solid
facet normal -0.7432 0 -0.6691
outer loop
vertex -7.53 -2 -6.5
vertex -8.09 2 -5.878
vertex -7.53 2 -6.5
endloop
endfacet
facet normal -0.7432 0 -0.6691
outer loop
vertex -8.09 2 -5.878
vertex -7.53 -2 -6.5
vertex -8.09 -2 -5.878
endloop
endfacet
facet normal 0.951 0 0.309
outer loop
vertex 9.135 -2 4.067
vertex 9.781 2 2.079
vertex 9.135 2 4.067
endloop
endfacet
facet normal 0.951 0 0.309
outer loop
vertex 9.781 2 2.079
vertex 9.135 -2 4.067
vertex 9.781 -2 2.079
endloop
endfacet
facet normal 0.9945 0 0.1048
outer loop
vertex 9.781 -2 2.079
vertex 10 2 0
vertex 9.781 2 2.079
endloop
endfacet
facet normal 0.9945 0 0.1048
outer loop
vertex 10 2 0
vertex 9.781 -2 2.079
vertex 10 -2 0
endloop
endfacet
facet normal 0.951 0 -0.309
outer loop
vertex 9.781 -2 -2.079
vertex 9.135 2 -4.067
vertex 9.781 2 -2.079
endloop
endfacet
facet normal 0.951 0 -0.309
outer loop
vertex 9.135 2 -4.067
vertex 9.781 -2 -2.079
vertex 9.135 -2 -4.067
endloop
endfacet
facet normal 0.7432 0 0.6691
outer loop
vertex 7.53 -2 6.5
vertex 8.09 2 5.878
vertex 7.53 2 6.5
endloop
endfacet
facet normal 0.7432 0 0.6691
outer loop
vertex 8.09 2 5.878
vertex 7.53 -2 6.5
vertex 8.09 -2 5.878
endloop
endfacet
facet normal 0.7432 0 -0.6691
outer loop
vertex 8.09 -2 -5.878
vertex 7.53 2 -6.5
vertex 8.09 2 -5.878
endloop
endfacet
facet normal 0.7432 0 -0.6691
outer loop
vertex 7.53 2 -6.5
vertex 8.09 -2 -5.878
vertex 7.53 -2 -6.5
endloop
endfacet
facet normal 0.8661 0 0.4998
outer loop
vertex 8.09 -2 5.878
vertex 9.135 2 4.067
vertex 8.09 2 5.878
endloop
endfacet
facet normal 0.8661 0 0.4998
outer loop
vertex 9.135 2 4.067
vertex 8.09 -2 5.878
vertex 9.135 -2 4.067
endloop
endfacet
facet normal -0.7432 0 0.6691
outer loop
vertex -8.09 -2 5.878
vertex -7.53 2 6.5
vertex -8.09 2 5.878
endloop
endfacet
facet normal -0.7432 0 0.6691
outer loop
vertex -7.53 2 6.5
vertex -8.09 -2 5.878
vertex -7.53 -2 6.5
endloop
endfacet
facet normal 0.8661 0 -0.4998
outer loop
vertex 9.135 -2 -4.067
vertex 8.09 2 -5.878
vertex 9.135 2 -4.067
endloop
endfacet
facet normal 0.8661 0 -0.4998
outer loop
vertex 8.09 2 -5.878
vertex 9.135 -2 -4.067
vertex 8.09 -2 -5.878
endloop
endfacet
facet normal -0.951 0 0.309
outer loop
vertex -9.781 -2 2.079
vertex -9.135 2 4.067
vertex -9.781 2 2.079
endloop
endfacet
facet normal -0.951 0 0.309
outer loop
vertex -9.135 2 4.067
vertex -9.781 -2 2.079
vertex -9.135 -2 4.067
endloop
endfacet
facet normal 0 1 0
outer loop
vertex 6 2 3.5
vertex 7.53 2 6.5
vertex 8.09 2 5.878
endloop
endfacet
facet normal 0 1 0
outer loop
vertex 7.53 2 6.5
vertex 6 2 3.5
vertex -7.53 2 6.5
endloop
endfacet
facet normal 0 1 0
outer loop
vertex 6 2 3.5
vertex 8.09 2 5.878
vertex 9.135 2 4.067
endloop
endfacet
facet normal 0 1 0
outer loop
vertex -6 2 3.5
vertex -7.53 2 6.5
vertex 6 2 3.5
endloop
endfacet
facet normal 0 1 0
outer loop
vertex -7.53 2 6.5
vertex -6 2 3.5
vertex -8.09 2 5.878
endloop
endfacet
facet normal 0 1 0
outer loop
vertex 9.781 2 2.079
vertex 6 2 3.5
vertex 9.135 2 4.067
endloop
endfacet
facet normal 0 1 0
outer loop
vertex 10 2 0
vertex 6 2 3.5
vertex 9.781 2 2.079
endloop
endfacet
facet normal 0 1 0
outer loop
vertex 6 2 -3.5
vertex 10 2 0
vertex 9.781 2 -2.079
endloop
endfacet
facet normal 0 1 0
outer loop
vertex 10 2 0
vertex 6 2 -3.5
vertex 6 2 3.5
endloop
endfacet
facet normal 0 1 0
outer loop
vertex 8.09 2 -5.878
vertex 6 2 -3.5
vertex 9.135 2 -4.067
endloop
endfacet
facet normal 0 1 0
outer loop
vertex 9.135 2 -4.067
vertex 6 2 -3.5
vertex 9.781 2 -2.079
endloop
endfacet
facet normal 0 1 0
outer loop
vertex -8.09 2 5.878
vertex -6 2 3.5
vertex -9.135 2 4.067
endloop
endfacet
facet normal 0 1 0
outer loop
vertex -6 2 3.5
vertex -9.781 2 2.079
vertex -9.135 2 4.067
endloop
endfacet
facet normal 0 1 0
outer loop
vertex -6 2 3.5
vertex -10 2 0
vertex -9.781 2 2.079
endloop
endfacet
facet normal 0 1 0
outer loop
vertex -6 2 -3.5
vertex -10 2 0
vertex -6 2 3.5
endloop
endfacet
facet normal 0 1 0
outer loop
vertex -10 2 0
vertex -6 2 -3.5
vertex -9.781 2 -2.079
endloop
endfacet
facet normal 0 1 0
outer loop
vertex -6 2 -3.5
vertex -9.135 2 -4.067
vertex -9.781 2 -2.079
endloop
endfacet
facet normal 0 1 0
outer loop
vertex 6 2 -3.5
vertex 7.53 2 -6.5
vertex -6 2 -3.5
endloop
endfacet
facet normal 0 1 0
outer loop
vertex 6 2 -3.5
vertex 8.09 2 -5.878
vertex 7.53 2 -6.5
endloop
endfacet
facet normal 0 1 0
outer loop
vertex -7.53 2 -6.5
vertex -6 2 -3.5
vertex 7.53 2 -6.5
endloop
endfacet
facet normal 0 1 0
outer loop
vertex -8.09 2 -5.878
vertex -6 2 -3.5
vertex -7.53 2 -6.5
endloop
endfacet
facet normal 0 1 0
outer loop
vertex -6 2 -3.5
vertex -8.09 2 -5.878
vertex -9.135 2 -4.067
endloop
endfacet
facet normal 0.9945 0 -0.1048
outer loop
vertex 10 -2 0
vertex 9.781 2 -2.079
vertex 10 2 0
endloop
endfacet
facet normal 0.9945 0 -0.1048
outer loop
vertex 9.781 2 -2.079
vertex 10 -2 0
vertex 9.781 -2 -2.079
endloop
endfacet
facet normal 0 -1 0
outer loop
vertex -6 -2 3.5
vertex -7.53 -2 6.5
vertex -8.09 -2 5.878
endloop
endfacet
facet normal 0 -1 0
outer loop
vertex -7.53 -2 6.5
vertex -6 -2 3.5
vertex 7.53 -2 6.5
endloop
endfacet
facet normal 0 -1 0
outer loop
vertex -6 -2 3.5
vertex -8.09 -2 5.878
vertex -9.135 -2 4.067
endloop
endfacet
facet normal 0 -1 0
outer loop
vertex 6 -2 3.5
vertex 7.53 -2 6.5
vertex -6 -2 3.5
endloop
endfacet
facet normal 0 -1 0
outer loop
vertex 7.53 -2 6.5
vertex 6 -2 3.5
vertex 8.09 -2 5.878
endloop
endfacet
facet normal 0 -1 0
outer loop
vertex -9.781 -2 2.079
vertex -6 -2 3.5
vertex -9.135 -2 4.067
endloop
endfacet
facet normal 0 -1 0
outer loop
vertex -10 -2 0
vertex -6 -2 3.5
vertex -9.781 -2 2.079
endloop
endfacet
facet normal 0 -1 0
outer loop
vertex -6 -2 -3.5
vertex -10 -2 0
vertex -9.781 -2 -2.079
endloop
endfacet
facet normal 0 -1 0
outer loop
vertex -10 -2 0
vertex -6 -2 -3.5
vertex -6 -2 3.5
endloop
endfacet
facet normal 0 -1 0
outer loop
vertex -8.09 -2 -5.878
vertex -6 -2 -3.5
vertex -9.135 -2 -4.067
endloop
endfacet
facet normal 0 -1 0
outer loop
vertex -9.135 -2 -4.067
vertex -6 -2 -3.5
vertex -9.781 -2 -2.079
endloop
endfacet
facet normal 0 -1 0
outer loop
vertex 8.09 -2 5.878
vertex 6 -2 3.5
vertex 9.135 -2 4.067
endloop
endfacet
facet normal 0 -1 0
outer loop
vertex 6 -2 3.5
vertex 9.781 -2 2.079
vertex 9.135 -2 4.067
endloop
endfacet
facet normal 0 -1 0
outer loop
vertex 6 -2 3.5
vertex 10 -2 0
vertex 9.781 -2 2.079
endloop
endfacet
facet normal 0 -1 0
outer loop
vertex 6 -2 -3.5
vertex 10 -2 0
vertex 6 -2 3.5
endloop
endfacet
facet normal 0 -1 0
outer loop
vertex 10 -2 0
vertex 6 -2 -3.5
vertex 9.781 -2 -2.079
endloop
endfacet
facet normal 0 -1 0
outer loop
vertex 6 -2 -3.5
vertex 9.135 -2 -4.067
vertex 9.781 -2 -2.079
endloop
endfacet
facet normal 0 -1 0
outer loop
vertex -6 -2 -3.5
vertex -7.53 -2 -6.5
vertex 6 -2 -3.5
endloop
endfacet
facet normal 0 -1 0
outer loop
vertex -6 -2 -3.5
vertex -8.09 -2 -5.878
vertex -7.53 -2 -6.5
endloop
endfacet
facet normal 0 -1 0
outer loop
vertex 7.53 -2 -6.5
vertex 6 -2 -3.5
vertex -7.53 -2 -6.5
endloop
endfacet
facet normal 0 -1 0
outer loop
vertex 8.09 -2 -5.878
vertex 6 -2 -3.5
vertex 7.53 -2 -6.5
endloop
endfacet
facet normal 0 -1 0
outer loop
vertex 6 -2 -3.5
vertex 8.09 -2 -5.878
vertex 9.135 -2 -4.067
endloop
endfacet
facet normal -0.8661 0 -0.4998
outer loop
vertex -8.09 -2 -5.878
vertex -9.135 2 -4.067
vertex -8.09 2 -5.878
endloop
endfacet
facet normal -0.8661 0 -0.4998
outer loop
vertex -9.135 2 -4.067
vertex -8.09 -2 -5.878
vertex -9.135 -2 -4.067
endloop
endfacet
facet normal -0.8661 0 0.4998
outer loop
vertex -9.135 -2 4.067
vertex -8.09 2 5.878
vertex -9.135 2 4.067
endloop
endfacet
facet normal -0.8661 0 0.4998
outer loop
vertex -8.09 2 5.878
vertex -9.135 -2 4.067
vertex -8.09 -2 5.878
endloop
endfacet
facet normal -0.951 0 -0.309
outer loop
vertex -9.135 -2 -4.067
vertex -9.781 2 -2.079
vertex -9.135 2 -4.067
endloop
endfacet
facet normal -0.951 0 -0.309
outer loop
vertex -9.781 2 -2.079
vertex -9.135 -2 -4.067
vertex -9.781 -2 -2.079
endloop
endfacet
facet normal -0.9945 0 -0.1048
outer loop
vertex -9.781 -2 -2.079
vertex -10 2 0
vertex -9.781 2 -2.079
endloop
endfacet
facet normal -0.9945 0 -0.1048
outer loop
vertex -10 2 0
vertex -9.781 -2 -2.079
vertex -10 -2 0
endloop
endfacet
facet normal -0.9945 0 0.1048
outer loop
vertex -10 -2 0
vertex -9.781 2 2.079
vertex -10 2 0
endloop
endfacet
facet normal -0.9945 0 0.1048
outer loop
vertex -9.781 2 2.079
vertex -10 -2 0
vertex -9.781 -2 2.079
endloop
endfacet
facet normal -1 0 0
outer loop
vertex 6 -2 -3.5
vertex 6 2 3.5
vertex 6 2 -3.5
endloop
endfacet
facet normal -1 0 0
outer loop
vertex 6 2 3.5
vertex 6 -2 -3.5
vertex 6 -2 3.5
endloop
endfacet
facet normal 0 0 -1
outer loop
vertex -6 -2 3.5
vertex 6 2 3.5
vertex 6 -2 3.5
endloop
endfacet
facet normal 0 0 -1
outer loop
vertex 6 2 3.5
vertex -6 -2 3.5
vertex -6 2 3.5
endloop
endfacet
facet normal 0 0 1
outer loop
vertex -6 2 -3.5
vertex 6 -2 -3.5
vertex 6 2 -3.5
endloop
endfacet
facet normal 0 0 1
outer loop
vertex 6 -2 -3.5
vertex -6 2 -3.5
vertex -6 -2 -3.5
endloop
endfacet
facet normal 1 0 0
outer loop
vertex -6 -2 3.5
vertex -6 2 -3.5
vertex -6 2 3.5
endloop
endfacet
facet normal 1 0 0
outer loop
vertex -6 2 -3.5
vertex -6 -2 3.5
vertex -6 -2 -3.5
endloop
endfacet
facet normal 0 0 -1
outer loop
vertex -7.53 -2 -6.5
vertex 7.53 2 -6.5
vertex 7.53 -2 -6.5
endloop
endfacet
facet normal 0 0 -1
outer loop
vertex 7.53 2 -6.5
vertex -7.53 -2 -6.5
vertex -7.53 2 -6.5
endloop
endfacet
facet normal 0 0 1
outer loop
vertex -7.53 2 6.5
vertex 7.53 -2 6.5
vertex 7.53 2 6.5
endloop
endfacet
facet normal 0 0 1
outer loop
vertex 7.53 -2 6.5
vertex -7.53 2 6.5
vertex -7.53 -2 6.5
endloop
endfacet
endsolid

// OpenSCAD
difference() {
    // Spacer body
    rotate([90,0,0]) cylinder(d=20,h=4, center=true);
    
    // Shaft hole
    scale([12,25,7]) cube(1,1,1, center=true);
    
    // Top shave
    translate([0,0,-10]) scale([24,25,7]) cube(1,1,1, center=true);
    
    // Bottom shave
    translate([0,0,10]) scale([24,25,7]) cube(1,1,1, center=true);
}
